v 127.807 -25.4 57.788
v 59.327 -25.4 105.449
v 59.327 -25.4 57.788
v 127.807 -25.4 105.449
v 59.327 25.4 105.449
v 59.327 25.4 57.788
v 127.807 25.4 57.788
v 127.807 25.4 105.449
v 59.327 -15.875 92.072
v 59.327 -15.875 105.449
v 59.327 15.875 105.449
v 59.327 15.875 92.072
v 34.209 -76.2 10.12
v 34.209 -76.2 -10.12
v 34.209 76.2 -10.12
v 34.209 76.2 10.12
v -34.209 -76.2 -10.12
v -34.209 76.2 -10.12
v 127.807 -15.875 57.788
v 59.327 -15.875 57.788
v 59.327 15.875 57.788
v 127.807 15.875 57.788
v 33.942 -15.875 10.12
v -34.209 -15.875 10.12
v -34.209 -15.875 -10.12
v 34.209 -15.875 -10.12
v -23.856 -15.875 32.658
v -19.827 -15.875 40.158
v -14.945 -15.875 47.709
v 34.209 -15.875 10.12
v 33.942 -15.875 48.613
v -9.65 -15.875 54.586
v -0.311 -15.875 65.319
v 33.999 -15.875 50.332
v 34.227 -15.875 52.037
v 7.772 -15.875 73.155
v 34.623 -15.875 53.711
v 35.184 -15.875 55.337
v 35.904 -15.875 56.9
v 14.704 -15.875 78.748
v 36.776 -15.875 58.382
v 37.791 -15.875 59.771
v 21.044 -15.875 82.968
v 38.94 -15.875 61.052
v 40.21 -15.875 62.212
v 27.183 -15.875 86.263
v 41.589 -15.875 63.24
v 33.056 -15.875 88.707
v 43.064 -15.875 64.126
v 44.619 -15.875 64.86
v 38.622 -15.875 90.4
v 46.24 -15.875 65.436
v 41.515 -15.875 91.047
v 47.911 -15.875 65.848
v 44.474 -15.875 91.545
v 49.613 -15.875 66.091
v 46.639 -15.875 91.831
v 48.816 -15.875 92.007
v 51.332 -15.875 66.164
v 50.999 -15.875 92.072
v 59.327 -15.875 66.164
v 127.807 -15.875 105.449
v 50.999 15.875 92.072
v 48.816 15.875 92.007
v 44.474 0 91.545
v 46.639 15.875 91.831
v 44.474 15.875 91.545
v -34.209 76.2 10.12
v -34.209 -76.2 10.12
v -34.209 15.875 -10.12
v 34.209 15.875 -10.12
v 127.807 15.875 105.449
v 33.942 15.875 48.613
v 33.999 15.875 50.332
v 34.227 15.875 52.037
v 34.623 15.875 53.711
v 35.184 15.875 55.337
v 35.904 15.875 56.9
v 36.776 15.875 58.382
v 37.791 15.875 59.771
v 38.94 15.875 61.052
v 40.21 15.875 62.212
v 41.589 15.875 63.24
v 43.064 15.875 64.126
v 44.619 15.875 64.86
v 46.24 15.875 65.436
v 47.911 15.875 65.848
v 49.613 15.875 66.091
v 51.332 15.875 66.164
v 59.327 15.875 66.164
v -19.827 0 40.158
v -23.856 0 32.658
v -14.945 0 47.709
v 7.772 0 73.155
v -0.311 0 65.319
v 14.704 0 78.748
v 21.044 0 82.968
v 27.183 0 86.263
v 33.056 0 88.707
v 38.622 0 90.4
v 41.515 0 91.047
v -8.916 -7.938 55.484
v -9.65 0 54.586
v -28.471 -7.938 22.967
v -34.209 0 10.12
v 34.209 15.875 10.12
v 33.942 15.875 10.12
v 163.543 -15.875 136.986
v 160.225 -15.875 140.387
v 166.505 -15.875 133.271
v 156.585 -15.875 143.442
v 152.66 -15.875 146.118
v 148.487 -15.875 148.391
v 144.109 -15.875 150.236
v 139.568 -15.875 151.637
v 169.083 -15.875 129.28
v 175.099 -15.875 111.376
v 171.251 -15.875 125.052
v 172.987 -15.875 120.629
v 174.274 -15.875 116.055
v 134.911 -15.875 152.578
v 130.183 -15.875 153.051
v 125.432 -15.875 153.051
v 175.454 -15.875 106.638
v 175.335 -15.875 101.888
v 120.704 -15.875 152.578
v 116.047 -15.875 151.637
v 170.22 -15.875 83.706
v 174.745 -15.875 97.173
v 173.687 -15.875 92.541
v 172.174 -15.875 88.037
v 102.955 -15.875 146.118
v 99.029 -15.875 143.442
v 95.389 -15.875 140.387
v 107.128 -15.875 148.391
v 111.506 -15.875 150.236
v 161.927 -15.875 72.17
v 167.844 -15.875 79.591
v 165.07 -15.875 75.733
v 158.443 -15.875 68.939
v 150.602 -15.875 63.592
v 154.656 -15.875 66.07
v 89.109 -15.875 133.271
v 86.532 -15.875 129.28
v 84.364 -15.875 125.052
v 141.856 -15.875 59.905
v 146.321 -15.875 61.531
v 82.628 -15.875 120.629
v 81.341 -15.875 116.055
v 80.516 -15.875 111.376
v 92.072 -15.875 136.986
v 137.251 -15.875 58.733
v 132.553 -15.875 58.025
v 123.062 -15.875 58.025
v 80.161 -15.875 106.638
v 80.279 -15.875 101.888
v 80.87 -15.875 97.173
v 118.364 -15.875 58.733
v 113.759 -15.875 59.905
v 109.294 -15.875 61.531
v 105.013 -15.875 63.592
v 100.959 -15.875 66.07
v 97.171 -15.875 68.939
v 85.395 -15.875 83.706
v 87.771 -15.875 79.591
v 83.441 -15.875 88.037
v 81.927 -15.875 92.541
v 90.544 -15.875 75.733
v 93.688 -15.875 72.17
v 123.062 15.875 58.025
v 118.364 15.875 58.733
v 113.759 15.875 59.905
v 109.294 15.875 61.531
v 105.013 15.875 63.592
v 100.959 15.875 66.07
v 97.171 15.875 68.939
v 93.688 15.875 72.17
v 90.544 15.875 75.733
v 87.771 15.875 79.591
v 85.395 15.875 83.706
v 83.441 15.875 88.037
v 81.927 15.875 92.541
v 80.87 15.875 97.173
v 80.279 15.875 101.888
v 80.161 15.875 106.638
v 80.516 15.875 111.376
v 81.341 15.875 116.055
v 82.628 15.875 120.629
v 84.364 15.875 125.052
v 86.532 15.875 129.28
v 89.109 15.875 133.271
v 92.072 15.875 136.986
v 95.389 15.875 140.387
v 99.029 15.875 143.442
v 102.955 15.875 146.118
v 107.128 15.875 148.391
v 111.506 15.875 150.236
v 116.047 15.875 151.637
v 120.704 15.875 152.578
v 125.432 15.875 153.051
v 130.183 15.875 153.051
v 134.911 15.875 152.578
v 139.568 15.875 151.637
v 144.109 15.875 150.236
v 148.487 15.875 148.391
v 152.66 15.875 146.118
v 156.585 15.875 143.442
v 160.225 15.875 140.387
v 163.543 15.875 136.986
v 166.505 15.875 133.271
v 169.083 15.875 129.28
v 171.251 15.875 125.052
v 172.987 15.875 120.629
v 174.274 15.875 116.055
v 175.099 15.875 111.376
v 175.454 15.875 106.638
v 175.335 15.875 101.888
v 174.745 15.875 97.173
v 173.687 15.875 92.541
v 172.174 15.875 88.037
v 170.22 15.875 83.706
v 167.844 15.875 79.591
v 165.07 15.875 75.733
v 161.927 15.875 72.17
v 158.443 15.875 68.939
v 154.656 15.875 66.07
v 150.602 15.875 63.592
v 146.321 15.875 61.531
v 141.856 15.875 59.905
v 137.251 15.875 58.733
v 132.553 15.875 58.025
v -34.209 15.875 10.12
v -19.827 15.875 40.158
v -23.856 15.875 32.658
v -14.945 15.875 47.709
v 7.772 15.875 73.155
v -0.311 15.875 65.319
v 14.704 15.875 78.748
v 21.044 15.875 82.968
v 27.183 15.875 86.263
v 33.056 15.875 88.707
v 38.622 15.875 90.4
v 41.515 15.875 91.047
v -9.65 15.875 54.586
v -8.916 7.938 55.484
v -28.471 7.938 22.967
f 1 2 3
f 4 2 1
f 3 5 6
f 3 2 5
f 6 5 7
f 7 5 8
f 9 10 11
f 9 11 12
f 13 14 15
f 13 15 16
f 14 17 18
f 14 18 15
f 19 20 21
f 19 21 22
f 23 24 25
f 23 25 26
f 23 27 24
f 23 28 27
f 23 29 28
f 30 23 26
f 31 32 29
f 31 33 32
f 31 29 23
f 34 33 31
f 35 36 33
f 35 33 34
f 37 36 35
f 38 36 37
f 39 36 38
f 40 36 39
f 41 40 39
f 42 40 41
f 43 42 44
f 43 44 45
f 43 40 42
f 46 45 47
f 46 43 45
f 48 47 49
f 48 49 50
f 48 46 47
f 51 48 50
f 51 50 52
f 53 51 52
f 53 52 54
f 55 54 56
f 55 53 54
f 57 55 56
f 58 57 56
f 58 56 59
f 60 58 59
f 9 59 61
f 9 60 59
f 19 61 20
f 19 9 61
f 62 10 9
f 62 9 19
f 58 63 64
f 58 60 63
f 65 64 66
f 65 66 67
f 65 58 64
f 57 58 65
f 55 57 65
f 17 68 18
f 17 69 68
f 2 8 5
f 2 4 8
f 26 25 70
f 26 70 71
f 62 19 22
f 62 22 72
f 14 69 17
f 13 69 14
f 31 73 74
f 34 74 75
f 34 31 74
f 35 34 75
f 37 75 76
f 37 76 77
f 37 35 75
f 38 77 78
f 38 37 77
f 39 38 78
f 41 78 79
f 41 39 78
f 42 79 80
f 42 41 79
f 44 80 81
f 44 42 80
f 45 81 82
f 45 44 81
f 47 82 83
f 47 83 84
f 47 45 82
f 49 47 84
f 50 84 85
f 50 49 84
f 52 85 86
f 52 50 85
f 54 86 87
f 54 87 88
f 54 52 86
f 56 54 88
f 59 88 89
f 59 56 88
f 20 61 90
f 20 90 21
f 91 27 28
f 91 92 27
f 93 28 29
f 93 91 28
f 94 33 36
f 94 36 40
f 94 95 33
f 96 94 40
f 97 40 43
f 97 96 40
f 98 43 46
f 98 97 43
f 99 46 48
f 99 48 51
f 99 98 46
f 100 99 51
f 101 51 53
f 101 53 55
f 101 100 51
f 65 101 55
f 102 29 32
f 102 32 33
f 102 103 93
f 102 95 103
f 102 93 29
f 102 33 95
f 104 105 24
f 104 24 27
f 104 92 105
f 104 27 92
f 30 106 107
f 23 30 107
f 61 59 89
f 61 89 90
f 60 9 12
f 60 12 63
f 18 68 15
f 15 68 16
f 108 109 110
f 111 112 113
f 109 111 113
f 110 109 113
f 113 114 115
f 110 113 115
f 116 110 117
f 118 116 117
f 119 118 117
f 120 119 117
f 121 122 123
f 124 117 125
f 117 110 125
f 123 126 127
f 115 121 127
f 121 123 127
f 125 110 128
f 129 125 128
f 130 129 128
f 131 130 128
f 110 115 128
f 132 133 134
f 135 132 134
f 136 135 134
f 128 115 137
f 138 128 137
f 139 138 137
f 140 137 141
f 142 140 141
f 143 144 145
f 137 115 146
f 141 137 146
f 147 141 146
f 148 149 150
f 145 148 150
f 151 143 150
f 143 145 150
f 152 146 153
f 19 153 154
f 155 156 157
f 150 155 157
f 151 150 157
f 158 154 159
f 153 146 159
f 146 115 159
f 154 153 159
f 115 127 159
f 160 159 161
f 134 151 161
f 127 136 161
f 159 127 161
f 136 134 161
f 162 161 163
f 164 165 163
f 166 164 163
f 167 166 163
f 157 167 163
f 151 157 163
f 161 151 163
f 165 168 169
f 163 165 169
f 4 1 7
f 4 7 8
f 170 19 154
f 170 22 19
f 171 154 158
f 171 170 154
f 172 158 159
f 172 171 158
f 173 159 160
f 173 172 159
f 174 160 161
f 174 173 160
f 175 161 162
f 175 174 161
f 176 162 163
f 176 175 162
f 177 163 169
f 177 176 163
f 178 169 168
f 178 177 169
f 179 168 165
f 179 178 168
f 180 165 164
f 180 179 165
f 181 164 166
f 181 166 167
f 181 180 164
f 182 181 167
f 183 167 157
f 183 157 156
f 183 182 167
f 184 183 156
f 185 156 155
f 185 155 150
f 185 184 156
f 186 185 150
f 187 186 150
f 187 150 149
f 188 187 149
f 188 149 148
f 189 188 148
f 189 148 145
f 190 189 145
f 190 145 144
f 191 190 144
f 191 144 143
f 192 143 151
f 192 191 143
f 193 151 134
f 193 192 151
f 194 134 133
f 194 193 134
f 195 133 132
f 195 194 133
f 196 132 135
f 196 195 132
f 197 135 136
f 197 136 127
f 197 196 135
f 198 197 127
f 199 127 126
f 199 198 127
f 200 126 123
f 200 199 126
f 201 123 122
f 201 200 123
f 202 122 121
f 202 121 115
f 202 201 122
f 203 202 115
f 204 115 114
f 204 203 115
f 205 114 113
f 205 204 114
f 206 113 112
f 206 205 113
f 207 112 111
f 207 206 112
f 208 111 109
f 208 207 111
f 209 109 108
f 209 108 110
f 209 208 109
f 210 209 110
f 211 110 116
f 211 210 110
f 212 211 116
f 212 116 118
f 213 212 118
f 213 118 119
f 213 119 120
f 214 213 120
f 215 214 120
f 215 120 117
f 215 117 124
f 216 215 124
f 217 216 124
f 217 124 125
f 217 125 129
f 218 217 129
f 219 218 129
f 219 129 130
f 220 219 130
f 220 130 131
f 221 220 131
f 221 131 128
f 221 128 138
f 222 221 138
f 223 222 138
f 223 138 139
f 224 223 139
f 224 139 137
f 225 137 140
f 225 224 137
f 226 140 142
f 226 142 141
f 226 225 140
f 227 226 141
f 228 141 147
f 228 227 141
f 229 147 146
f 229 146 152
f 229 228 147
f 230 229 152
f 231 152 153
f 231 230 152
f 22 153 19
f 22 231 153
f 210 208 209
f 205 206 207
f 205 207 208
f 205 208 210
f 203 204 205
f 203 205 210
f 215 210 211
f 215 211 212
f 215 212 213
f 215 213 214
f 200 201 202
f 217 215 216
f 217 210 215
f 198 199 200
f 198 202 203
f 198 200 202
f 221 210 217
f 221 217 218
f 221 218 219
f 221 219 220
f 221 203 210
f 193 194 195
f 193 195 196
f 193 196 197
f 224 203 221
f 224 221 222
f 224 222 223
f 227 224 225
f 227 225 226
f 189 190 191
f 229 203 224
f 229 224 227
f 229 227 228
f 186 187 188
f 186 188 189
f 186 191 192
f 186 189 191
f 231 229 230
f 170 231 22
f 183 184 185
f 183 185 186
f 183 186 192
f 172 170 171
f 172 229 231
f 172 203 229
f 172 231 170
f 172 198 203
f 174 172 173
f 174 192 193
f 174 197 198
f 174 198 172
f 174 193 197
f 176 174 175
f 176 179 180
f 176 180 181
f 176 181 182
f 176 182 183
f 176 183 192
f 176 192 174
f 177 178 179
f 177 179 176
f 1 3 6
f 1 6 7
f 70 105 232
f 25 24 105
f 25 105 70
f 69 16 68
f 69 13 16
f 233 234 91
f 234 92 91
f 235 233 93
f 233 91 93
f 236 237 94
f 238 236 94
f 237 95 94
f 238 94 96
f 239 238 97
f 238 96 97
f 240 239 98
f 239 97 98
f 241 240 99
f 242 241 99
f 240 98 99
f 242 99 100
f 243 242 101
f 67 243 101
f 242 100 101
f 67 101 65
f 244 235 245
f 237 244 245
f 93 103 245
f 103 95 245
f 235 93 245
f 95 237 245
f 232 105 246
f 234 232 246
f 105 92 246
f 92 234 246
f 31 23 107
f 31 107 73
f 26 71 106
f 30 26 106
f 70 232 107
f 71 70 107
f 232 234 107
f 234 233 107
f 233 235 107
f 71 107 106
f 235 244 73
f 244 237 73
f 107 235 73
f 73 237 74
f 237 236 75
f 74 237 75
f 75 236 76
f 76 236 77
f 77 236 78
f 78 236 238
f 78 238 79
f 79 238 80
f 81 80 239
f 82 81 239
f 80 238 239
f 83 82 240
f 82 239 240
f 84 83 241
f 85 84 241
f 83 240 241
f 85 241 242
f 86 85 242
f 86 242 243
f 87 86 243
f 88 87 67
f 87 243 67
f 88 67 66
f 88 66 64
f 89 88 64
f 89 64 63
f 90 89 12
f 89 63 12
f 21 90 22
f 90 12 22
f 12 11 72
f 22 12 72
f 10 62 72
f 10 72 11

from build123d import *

# Parameters (mm, degrees)
F1_DEPTH  = 76.2
F2_DEPTH  = 25.4
F3_DEPTH  = 15.875
F3_FACE_W = 31.75
F3_FACE_H = 47.6612813593


with BuildPart() as f1:
    # F0 (on Front) → F1 (new body, symmetric)
    with BuildSketch(Plane.XZ):
        Polygon((-34.2090905497, 10.1201273501), (-34.2090905497, -10.1201273501), (34.2090905497, -10.1201273501), (34.2090905497, 10.1201273501), (33.9421695098, 10.1201273501), (8.0341696739, 10.1201273501), align=None)
    extrude(amount=F1_DEPTH, both=True)


with BuildPart() as f2:
    # F0 (on Front) → F2 (new body, symmetric)
    with BuildSketch(Plane.XZ):
        Polygon((59.3270622194, 105.4492775262), (59.3270622194, 92.0723080635), (59.3270622194, 66.1643082276), (59.3270622194, 57.7879961669), (127.8074011207, 57.7879961669), (127.8074011207, 105.4492775262), align=None)
    extrude(amount=F2_DEPTH, both=True)


with BuildPart() as f3:
    # F0 (on Front) → F3 (new body, symmetric)
    with BuildSketch(Plane.XZ):
        Polygon((-34.2090905497, 10.1201273501), (-34.2090905497, -10.1201273501), (34.2090905497, -10.1201273501), (34.2090905497, 10.1201273501), (33.9421695098, 10.1201273501), (8.0341696739, 10.1201273501), align=None)
        with BuildLine():
            add(Edge.make_bspline(
                [(-34.2090905497, 10.1201273501), (-22.3805145575, 37.0394678872), (-15.0816373574, 50.14667541), (19.7210816662, 88.0589285063), (44.474039968, 91.545170031)],
                knots=[0, 0, 0, 0, 0.4624058701, 0.9574946773, 0.9574946773, 0.9574946773, 0.9574946773], degree=3))
            Line((-34.2090905497, 10.1201273501), (8.0341696739, 10.1201273501))
            Line((8.0341696739, 10.1201273501), (8.0341696739, 48.4448044045))
            ThreePointArc((8.0341696739, 48.4448044045), (18.2354528521, 76.7744804641), (44.474039968, 91.545170031))
        make_face()
        with BuildLine():
            Line((8.0341696739, 48.4448044045), (8.0341696739, 10.1201273501))
            Line((8.0341696739, 10.1201273501), (33.9421695098, 10.1201273501))
            Line((33.9421695098, 10.1201273501), (33.9421695098, 48.6127595879))
            ThreePointArc((33.9421695098, 48.6127595879), (38.9397076098, 61.0519617659), (51.3321670727, 66.1643082276))
            Line((51.3321670727, 66.1643082276), (59.3270622194, 66.1643082276))
            Line((59.3270622194, 66.1643082276), (59.3270622194, 92.0723080635))
            Line((59.3270622194, 92.0723080635), (50.9985089302, 92.0723080635))
            add(Edge.make_bspline(
                [(44.474039968, 91.545170031), (46.5991788631, 91.8444775873), (48.7741275188, 92.0249888934), (50.9985089302, 92.0723080635)],
                knots=[0.9574946773, 0.9574946773, 0.9574946773, 0.9574946773, 1, 1, 1, 1], degree=3))
            ThreePointArc((44.474039968, 91.545170031), (18.2354528521, 76.7744804641), (8.0341696739, 48.4448044045))
        make_face()
        with BuildLine():
            ThreePointArc((50.9985089302, 92.0723080635), (47.726269289, 91.9325744619), (44.474039968, 91.545170031))
            add(Edge.make_bspline(
                [(44.474039968, 91.545170031), (46.5991788631, 91.8444775873), (48.7741275188, 92.0249888934), (50.9985089302, 92.0723080635)],
                knots=[0.9574946773, 0.9574946773, 0.9574946773, 0.9574946773, 1, 1, 1, 1], degree=3))
        make_face()
        Polygon((59.3270622194, 105.4492775262), (59.3270622194, 92.0723080635), (59.3270622194, 66.1643082276), (59.3270622194, 57.7879961669), (127.8074011207, 57.7879961669), (127.8074011207, 105.4492775262), align=None)
    extrude(amount=F3_DEPTH, both=True)


with BuildPart() as f4:
    # F3_face (on face) → F4 (revolve)
    with BuildSketch(Plane(origin=(127.8074011207, 0, 81.6186368465), x_dir=(0, 1, 0), z_dir=(1, 0, 0))):
        Rectangle(F3_FACE_W, F3_FACE_H)
    revolve(axis=Axis((127.8074011207, 0, 105.4492775262), (0, 1, 0)))


solid = Compound([f1.part, f2.part, f3.part, f4.part])
